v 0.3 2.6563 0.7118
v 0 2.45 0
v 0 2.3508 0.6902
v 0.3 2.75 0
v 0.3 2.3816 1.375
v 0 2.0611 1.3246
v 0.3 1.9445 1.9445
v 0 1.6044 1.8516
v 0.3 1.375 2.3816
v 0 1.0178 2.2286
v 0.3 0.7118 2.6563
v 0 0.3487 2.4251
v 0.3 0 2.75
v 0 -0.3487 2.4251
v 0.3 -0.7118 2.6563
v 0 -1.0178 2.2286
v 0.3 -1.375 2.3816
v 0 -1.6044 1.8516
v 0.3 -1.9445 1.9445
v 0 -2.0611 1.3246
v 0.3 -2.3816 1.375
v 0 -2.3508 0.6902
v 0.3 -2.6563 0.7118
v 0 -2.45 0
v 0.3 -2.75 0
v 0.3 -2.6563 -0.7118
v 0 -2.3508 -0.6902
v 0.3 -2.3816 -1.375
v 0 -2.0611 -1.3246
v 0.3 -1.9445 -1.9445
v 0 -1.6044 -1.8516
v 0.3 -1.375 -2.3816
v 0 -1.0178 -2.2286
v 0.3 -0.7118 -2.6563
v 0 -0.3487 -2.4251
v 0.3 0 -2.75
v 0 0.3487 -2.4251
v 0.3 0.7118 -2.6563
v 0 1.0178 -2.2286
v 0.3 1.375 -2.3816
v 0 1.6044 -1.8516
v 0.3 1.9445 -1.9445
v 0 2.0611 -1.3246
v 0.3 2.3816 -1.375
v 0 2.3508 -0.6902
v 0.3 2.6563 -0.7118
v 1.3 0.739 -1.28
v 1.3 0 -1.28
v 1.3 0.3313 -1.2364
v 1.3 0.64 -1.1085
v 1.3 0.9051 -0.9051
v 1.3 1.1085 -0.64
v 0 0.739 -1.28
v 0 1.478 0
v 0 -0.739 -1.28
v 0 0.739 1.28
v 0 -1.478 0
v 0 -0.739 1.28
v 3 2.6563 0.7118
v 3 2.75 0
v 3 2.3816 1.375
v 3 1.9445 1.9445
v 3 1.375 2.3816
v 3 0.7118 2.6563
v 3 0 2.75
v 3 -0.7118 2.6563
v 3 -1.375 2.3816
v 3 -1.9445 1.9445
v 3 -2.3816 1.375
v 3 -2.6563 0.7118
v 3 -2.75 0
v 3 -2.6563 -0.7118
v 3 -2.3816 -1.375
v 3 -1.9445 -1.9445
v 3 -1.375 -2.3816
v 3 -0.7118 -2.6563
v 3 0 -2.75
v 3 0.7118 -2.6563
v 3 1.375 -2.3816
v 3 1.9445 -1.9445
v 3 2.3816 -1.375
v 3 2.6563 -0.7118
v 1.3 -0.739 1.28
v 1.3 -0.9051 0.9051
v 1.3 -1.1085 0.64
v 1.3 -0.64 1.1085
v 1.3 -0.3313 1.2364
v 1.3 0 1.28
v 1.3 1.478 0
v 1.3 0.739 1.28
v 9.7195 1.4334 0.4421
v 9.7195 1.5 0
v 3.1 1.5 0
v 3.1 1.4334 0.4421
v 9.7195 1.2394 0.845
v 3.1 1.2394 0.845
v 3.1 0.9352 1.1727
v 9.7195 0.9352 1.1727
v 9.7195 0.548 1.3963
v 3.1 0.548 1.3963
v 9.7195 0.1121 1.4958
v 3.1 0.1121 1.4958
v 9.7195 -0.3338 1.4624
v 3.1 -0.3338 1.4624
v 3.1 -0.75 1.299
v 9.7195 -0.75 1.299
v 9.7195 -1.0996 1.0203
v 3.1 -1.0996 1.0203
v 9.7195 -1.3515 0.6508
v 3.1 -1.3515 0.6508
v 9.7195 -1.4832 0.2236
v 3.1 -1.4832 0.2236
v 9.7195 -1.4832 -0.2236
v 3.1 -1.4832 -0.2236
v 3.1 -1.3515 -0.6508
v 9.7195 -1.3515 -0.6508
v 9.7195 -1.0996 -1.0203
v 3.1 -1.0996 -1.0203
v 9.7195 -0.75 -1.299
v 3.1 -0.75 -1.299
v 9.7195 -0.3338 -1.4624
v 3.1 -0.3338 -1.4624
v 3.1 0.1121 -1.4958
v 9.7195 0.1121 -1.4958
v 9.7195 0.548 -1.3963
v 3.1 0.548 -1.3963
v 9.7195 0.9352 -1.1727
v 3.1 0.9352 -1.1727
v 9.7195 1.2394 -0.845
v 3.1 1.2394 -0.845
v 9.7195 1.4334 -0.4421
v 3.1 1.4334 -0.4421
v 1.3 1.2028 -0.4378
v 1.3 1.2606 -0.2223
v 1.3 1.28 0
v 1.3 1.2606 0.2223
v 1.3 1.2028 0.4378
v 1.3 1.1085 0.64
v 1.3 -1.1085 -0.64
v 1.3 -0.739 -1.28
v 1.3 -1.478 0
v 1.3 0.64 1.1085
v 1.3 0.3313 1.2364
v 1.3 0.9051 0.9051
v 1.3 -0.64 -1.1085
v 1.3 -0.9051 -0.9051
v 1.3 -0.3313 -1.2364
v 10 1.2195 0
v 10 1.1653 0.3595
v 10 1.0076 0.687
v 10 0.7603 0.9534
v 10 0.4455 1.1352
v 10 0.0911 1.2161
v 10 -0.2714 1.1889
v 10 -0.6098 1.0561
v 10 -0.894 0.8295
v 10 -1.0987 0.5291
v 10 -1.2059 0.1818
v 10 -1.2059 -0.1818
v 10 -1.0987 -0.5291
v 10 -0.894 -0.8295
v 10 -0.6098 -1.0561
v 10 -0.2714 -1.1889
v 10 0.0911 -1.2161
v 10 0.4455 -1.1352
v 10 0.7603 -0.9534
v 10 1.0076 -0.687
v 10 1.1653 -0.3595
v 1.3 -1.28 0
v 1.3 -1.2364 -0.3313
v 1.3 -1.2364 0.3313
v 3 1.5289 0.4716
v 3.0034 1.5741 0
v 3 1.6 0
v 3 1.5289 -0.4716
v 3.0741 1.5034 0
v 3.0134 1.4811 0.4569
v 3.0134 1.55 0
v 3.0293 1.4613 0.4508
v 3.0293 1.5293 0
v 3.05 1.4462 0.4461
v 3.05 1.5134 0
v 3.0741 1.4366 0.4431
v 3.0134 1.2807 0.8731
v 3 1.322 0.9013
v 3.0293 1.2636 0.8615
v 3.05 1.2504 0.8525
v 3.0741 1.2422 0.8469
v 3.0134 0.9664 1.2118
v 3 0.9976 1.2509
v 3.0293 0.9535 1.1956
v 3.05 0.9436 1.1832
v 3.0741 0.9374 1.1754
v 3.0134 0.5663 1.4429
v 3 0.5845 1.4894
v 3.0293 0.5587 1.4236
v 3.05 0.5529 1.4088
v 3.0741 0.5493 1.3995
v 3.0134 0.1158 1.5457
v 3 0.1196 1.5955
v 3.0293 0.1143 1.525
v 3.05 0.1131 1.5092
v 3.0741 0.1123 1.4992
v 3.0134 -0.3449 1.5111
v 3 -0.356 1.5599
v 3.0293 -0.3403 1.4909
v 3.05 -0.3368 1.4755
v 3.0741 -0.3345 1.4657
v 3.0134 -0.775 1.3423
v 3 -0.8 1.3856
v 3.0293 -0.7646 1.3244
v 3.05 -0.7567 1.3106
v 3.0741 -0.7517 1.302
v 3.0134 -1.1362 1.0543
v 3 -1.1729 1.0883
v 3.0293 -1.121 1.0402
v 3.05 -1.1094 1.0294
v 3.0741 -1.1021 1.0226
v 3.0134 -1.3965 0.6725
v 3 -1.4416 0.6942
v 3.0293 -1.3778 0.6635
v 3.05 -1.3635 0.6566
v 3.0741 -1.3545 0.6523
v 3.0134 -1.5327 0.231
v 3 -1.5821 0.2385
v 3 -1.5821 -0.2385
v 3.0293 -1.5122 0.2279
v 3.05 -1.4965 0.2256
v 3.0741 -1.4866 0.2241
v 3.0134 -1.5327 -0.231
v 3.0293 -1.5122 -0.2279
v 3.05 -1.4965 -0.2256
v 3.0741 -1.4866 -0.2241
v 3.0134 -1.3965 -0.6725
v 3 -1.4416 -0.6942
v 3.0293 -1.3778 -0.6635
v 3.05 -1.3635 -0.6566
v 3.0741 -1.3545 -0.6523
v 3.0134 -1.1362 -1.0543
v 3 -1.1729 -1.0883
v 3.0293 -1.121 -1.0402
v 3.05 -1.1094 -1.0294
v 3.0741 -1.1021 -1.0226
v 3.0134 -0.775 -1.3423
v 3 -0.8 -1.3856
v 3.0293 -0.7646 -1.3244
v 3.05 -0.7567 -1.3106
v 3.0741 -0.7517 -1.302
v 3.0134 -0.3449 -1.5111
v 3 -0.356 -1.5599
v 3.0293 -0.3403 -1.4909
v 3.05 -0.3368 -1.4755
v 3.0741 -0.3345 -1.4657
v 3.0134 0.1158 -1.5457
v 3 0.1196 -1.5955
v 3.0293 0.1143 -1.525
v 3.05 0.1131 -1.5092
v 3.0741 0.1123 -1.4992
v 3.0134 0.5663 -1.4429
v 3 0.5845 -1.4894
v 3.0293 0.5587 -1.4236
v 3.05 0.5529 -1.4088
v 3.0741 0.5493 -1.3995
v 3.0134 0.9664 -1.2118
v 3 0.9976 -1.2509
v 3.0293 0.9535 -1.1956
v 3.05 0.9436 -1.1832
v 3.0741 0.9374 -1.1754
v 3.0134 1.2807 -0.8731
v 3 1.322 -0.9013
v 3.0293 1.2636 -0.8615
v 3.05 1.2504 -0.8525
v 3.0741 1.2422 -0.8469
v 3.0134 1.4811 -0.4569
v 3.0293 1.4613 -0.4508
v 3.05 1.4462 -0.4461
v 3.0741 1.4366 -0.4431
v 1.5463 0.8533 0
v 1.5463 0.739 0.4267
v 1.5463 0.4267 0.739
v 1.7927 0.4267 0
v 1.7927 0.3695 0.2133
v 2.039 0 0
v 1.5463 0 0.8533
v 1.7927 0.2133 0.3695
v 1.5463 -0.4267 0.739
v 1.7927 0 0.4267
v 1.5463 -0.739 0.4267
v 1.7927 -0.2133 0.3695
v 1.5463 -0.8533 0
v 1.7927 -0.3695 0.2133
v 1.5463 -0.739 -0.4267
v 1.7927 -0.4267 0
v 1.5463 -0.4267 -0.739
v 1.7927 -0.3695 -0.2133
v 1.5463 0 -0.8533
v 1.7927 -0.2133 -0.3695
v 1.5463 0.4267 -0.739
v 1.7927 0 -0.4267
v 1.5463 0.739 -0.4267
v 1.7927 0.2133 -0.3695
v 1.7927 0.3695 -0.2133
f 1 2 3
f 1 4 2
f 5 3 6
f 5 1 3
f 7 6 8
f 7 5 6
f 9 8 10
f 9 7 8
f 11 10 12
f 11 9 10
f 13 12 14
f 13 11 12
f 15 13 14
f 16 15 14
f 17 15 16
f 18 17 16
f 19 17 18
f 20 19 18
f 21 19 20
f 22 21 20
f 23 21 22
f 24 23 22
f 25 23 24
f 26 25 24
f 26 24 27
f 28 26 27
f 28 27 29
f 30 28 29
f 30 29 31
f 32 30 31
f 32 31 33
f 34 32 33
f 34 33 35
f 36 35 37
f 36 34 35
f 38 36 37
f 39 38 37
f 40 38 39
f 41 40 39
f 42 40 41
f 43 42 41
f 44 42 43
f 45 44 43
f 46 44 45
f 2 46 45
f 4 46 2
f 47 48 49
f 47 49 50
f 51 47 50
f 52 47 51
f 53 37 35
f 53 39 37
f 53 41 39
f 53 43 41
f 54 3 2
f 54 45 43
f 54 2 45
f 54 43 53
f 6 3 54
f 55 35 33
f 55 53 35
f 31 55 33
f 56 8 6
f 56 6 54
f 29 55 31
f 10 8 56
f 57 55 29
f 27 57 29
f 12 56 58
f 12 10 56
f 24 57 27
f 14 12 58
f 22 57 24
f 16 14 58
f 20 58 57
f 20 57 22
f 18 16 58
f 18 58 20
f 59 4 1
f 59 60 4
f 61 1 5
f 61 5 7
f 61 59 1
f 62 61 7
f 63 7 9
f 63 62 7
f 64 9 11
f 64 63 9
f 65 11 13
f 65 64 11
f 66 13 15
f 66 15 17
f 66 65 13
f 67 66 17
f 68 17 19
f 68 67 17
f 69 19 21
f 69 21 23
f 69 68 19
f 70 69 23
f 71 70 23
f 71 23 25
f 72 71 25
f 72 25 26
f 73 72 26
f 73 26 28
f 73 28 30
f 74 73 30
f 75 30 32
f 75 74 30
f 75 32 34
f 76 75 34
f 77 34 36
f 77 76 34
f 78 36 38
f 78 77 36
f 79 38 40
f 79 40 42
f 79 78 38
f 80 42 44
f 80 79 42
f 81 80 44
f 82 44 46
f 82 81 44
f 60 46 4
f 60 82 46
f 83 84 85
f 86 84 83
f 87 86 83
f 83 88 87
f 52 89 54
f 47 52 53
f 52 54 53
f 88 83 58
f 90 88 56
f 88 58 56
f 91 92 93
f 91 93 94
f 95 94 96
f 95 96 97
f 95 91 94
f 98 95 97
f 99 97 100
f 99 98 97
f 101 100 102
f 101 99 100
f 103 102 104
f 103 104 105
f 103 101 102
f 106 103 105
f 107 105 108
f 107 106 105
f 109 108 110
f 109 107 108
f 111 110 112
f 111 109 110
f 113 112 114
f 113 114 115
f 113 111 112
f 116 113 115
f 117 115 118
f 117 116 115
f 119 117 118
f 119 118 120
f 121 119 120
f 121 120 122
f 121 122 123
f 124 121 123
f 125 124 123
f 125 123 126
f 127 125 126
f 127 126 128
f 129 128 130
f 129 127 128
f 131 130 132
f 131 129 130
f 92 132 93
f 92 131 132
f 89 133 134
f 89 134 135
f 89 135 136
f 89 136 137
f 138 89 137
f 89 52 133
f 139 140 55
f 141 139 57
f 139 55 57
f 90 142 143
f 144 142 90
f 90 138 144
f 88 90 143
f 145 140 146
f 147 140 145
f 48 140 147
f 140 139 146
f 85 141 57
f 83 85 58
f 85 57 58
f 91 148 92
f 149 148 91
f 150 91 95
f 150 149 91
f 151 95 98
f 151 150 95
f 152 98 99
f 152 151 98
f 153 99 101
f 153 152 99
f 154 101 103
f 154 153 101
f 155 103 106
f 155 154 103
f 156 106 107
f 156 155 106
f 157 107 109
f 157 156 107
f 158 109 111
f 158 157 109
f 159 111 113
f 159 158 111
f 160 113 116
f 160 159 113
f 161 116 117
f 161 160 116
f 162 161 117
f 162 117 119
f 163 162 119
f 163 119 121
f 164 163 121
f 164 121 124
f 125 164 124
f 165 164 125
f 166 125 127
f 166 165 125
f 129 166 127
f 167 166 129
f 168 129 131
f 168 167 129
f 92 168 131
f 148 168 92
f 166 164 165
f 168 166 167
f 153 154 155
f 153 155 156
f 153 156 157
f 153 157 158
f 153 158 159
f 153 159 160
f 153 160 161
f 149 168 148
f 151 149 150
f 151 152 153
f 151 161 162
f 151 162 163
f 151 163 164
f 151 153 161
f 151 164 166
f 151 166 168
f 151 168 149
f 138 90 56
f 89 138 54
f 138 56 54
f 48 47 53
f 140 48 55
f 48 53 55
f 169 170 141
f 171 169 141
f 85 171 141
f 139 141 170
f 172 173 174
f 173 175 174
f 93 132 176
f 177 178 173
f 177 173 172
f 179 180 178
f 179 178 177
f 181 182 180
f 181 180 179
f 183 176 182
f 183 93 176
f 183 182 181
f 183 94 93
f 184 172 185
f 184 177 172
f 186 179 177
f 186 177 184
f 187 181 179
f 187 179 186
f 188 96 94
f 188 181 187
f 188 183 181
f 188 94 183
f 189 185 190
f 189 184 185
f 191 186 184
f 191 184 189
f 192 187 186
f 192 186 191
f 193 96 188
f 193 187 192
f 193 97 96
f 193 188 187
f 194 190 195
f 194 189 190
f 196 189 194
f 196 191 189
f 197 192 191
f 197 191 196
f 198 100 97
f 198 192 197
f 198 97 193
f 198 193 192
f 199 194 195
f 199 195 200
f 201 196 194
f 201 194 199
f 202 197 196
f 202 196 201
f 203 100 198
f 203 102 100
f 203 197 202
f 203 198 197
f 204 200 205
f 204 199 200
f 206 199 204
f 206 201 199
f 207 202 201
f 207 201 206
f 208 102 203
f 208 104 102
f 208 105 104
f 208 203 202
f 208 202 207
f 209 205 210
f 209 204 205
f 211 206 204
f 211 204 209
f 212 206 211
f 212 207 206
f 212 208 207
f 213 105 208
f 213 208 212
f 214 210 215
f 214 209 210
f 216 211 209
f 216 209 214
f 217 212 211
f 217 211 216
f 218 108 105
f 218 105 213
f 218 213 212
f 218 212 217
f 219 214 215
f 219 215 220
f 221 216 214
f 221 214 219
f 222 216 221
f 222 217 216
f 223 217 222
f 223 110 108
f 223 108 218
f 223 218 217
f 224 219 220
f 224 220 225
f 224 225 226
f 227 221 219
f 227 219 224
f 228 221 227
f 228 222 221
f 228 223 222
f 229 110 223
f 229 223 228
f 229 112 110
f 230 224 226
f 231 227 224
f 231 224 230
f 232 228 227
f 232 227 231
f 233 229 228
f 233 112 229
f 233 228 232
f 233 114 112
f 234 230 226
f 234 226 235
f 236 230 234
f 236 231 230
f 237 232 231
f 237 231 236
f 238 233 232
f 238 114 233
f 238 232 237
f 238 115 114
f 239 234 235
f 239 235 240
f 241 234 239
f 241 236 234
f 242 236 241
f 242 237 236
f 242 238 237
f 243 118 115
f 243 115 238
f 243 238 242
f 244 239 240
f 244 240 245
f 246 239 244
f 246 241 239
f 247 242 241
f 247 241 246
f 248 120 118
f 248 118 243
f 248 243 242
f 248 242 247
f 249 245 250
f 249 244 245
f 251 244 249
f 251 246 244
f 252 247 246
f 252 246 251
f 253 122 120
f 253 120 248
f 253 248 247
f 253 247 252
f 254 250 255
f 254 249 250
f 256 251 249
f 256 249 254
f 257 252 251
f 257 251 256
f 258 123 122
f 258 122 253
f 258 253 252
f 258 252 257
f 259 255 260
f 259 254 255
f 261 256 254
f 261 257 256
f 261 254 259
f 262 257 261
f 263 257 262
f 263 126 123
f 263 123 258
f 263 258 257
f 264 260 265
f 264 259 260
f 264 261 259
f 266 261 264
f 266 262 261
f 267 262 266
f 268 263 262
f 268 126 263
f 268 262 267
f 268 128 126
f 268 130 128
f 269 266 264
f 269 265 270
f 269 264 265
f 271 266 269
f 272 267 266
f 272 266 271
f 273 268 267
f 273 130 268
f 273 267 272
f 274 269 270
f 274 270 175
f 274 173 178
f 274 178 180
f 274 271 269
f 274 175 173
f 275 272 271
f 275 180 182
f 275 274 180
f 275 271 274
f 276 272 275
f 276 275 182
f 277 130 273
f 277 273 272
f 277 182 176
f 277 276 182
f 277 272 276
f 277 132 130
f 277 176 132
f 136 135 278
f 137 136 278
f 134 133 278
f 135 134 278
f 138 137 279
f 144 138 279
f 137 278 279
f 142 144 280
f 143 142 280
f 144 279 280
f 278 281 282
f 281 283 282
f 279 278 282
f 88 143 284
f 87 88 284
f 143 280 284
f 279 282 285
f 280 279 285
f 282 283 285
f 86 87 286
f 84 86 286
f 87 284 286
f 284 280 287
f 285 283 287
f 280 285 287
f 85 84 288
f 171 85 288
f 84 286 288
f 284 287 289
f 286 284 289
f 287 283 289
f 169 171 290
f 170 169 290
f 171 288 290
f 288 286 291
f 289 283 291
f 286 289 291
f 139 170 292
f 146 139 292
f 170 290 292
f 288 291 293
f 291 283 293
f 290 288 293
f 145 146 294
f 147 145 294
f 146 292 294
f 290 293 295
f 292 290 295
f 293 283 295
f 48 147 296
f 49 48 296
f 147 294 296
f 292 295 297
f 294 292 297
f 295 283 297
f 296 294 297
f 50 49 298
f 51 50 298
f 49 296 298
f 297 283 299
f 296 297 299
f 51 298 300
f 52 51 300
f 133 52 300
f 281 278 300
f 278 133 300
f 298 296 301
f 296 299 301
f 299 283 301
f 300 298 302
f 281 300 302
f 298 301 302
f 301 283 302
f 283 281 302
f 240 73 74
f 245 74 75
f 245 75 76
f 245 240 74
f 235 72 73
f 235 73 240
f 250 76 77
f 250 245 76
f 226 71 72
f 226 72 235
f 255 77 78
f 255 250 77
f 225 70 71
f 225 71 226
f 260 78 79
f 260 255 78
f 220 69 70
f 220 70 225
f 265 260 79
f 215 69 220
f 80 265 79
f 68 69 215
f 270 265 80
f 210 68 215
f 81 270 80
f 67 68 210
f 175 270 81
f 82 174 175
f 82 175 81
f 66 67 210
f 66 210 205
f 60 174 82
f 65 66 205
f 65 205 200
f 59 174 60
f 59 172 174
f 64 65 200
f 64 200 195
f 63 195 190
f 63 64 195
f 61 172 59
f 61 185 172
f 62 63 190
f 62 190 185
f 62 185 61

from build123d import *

# Parameters (mm, degrees)
FILLET1_R   = 0.1
HEX_2_DEPTH = 1.3


with BuildPart() as part:
    # BodySke → Base-Revolve (revolve)
    with BuildSketch(Plane.XY):
        Polygon((0, 0), (0, 2.45), (0.3, 2.75), (3, 2.75), (3, 1.5), (9.7195, 1.5), (10, 1.2195), (10, 0), align=None)
    revolve(axis=Axis((-31.75, 0, 0), (1, 0, 0)))

    # Fillet1
    fillet1_edges = [part.edges().sort_by_distance(p)[0] for p in [
        (3, -1.5, 0),
    ]]
    fillet(fillet1_edges, radius=FILLET1_R)

    # Sketch2 → Hex-PreBroach (revolve, cut)
    with BuildSketch(Plane.XY):
        Polygon((0, 1.28), (1.3, 1.28), (2.039008345, 0), (0, 0), align=None)
    revolve(axis=Axis((0, 0, 0), (1, 0, 0)), mode=Mode.SUBTRACT)

    # Sketch3 → Hex 2 (cut)
    with BuildSketch(Plane(origin=(0, 0, 0), x_dir=(0, 0.5, 0.866025404), z_dir=(-1, 0, 0))):
        Polygon((0.739008345, 1.28), (-0.739008345, 1.28), (-1.478016689, 0), (-0.739008345, -1.28), (0.739008345, -1.28), (1.478016689, 0), align=None)
    extrude(amount=-HEX_2_DEPTH, mode=Mode.SUBTRACT)


solid = part.part
